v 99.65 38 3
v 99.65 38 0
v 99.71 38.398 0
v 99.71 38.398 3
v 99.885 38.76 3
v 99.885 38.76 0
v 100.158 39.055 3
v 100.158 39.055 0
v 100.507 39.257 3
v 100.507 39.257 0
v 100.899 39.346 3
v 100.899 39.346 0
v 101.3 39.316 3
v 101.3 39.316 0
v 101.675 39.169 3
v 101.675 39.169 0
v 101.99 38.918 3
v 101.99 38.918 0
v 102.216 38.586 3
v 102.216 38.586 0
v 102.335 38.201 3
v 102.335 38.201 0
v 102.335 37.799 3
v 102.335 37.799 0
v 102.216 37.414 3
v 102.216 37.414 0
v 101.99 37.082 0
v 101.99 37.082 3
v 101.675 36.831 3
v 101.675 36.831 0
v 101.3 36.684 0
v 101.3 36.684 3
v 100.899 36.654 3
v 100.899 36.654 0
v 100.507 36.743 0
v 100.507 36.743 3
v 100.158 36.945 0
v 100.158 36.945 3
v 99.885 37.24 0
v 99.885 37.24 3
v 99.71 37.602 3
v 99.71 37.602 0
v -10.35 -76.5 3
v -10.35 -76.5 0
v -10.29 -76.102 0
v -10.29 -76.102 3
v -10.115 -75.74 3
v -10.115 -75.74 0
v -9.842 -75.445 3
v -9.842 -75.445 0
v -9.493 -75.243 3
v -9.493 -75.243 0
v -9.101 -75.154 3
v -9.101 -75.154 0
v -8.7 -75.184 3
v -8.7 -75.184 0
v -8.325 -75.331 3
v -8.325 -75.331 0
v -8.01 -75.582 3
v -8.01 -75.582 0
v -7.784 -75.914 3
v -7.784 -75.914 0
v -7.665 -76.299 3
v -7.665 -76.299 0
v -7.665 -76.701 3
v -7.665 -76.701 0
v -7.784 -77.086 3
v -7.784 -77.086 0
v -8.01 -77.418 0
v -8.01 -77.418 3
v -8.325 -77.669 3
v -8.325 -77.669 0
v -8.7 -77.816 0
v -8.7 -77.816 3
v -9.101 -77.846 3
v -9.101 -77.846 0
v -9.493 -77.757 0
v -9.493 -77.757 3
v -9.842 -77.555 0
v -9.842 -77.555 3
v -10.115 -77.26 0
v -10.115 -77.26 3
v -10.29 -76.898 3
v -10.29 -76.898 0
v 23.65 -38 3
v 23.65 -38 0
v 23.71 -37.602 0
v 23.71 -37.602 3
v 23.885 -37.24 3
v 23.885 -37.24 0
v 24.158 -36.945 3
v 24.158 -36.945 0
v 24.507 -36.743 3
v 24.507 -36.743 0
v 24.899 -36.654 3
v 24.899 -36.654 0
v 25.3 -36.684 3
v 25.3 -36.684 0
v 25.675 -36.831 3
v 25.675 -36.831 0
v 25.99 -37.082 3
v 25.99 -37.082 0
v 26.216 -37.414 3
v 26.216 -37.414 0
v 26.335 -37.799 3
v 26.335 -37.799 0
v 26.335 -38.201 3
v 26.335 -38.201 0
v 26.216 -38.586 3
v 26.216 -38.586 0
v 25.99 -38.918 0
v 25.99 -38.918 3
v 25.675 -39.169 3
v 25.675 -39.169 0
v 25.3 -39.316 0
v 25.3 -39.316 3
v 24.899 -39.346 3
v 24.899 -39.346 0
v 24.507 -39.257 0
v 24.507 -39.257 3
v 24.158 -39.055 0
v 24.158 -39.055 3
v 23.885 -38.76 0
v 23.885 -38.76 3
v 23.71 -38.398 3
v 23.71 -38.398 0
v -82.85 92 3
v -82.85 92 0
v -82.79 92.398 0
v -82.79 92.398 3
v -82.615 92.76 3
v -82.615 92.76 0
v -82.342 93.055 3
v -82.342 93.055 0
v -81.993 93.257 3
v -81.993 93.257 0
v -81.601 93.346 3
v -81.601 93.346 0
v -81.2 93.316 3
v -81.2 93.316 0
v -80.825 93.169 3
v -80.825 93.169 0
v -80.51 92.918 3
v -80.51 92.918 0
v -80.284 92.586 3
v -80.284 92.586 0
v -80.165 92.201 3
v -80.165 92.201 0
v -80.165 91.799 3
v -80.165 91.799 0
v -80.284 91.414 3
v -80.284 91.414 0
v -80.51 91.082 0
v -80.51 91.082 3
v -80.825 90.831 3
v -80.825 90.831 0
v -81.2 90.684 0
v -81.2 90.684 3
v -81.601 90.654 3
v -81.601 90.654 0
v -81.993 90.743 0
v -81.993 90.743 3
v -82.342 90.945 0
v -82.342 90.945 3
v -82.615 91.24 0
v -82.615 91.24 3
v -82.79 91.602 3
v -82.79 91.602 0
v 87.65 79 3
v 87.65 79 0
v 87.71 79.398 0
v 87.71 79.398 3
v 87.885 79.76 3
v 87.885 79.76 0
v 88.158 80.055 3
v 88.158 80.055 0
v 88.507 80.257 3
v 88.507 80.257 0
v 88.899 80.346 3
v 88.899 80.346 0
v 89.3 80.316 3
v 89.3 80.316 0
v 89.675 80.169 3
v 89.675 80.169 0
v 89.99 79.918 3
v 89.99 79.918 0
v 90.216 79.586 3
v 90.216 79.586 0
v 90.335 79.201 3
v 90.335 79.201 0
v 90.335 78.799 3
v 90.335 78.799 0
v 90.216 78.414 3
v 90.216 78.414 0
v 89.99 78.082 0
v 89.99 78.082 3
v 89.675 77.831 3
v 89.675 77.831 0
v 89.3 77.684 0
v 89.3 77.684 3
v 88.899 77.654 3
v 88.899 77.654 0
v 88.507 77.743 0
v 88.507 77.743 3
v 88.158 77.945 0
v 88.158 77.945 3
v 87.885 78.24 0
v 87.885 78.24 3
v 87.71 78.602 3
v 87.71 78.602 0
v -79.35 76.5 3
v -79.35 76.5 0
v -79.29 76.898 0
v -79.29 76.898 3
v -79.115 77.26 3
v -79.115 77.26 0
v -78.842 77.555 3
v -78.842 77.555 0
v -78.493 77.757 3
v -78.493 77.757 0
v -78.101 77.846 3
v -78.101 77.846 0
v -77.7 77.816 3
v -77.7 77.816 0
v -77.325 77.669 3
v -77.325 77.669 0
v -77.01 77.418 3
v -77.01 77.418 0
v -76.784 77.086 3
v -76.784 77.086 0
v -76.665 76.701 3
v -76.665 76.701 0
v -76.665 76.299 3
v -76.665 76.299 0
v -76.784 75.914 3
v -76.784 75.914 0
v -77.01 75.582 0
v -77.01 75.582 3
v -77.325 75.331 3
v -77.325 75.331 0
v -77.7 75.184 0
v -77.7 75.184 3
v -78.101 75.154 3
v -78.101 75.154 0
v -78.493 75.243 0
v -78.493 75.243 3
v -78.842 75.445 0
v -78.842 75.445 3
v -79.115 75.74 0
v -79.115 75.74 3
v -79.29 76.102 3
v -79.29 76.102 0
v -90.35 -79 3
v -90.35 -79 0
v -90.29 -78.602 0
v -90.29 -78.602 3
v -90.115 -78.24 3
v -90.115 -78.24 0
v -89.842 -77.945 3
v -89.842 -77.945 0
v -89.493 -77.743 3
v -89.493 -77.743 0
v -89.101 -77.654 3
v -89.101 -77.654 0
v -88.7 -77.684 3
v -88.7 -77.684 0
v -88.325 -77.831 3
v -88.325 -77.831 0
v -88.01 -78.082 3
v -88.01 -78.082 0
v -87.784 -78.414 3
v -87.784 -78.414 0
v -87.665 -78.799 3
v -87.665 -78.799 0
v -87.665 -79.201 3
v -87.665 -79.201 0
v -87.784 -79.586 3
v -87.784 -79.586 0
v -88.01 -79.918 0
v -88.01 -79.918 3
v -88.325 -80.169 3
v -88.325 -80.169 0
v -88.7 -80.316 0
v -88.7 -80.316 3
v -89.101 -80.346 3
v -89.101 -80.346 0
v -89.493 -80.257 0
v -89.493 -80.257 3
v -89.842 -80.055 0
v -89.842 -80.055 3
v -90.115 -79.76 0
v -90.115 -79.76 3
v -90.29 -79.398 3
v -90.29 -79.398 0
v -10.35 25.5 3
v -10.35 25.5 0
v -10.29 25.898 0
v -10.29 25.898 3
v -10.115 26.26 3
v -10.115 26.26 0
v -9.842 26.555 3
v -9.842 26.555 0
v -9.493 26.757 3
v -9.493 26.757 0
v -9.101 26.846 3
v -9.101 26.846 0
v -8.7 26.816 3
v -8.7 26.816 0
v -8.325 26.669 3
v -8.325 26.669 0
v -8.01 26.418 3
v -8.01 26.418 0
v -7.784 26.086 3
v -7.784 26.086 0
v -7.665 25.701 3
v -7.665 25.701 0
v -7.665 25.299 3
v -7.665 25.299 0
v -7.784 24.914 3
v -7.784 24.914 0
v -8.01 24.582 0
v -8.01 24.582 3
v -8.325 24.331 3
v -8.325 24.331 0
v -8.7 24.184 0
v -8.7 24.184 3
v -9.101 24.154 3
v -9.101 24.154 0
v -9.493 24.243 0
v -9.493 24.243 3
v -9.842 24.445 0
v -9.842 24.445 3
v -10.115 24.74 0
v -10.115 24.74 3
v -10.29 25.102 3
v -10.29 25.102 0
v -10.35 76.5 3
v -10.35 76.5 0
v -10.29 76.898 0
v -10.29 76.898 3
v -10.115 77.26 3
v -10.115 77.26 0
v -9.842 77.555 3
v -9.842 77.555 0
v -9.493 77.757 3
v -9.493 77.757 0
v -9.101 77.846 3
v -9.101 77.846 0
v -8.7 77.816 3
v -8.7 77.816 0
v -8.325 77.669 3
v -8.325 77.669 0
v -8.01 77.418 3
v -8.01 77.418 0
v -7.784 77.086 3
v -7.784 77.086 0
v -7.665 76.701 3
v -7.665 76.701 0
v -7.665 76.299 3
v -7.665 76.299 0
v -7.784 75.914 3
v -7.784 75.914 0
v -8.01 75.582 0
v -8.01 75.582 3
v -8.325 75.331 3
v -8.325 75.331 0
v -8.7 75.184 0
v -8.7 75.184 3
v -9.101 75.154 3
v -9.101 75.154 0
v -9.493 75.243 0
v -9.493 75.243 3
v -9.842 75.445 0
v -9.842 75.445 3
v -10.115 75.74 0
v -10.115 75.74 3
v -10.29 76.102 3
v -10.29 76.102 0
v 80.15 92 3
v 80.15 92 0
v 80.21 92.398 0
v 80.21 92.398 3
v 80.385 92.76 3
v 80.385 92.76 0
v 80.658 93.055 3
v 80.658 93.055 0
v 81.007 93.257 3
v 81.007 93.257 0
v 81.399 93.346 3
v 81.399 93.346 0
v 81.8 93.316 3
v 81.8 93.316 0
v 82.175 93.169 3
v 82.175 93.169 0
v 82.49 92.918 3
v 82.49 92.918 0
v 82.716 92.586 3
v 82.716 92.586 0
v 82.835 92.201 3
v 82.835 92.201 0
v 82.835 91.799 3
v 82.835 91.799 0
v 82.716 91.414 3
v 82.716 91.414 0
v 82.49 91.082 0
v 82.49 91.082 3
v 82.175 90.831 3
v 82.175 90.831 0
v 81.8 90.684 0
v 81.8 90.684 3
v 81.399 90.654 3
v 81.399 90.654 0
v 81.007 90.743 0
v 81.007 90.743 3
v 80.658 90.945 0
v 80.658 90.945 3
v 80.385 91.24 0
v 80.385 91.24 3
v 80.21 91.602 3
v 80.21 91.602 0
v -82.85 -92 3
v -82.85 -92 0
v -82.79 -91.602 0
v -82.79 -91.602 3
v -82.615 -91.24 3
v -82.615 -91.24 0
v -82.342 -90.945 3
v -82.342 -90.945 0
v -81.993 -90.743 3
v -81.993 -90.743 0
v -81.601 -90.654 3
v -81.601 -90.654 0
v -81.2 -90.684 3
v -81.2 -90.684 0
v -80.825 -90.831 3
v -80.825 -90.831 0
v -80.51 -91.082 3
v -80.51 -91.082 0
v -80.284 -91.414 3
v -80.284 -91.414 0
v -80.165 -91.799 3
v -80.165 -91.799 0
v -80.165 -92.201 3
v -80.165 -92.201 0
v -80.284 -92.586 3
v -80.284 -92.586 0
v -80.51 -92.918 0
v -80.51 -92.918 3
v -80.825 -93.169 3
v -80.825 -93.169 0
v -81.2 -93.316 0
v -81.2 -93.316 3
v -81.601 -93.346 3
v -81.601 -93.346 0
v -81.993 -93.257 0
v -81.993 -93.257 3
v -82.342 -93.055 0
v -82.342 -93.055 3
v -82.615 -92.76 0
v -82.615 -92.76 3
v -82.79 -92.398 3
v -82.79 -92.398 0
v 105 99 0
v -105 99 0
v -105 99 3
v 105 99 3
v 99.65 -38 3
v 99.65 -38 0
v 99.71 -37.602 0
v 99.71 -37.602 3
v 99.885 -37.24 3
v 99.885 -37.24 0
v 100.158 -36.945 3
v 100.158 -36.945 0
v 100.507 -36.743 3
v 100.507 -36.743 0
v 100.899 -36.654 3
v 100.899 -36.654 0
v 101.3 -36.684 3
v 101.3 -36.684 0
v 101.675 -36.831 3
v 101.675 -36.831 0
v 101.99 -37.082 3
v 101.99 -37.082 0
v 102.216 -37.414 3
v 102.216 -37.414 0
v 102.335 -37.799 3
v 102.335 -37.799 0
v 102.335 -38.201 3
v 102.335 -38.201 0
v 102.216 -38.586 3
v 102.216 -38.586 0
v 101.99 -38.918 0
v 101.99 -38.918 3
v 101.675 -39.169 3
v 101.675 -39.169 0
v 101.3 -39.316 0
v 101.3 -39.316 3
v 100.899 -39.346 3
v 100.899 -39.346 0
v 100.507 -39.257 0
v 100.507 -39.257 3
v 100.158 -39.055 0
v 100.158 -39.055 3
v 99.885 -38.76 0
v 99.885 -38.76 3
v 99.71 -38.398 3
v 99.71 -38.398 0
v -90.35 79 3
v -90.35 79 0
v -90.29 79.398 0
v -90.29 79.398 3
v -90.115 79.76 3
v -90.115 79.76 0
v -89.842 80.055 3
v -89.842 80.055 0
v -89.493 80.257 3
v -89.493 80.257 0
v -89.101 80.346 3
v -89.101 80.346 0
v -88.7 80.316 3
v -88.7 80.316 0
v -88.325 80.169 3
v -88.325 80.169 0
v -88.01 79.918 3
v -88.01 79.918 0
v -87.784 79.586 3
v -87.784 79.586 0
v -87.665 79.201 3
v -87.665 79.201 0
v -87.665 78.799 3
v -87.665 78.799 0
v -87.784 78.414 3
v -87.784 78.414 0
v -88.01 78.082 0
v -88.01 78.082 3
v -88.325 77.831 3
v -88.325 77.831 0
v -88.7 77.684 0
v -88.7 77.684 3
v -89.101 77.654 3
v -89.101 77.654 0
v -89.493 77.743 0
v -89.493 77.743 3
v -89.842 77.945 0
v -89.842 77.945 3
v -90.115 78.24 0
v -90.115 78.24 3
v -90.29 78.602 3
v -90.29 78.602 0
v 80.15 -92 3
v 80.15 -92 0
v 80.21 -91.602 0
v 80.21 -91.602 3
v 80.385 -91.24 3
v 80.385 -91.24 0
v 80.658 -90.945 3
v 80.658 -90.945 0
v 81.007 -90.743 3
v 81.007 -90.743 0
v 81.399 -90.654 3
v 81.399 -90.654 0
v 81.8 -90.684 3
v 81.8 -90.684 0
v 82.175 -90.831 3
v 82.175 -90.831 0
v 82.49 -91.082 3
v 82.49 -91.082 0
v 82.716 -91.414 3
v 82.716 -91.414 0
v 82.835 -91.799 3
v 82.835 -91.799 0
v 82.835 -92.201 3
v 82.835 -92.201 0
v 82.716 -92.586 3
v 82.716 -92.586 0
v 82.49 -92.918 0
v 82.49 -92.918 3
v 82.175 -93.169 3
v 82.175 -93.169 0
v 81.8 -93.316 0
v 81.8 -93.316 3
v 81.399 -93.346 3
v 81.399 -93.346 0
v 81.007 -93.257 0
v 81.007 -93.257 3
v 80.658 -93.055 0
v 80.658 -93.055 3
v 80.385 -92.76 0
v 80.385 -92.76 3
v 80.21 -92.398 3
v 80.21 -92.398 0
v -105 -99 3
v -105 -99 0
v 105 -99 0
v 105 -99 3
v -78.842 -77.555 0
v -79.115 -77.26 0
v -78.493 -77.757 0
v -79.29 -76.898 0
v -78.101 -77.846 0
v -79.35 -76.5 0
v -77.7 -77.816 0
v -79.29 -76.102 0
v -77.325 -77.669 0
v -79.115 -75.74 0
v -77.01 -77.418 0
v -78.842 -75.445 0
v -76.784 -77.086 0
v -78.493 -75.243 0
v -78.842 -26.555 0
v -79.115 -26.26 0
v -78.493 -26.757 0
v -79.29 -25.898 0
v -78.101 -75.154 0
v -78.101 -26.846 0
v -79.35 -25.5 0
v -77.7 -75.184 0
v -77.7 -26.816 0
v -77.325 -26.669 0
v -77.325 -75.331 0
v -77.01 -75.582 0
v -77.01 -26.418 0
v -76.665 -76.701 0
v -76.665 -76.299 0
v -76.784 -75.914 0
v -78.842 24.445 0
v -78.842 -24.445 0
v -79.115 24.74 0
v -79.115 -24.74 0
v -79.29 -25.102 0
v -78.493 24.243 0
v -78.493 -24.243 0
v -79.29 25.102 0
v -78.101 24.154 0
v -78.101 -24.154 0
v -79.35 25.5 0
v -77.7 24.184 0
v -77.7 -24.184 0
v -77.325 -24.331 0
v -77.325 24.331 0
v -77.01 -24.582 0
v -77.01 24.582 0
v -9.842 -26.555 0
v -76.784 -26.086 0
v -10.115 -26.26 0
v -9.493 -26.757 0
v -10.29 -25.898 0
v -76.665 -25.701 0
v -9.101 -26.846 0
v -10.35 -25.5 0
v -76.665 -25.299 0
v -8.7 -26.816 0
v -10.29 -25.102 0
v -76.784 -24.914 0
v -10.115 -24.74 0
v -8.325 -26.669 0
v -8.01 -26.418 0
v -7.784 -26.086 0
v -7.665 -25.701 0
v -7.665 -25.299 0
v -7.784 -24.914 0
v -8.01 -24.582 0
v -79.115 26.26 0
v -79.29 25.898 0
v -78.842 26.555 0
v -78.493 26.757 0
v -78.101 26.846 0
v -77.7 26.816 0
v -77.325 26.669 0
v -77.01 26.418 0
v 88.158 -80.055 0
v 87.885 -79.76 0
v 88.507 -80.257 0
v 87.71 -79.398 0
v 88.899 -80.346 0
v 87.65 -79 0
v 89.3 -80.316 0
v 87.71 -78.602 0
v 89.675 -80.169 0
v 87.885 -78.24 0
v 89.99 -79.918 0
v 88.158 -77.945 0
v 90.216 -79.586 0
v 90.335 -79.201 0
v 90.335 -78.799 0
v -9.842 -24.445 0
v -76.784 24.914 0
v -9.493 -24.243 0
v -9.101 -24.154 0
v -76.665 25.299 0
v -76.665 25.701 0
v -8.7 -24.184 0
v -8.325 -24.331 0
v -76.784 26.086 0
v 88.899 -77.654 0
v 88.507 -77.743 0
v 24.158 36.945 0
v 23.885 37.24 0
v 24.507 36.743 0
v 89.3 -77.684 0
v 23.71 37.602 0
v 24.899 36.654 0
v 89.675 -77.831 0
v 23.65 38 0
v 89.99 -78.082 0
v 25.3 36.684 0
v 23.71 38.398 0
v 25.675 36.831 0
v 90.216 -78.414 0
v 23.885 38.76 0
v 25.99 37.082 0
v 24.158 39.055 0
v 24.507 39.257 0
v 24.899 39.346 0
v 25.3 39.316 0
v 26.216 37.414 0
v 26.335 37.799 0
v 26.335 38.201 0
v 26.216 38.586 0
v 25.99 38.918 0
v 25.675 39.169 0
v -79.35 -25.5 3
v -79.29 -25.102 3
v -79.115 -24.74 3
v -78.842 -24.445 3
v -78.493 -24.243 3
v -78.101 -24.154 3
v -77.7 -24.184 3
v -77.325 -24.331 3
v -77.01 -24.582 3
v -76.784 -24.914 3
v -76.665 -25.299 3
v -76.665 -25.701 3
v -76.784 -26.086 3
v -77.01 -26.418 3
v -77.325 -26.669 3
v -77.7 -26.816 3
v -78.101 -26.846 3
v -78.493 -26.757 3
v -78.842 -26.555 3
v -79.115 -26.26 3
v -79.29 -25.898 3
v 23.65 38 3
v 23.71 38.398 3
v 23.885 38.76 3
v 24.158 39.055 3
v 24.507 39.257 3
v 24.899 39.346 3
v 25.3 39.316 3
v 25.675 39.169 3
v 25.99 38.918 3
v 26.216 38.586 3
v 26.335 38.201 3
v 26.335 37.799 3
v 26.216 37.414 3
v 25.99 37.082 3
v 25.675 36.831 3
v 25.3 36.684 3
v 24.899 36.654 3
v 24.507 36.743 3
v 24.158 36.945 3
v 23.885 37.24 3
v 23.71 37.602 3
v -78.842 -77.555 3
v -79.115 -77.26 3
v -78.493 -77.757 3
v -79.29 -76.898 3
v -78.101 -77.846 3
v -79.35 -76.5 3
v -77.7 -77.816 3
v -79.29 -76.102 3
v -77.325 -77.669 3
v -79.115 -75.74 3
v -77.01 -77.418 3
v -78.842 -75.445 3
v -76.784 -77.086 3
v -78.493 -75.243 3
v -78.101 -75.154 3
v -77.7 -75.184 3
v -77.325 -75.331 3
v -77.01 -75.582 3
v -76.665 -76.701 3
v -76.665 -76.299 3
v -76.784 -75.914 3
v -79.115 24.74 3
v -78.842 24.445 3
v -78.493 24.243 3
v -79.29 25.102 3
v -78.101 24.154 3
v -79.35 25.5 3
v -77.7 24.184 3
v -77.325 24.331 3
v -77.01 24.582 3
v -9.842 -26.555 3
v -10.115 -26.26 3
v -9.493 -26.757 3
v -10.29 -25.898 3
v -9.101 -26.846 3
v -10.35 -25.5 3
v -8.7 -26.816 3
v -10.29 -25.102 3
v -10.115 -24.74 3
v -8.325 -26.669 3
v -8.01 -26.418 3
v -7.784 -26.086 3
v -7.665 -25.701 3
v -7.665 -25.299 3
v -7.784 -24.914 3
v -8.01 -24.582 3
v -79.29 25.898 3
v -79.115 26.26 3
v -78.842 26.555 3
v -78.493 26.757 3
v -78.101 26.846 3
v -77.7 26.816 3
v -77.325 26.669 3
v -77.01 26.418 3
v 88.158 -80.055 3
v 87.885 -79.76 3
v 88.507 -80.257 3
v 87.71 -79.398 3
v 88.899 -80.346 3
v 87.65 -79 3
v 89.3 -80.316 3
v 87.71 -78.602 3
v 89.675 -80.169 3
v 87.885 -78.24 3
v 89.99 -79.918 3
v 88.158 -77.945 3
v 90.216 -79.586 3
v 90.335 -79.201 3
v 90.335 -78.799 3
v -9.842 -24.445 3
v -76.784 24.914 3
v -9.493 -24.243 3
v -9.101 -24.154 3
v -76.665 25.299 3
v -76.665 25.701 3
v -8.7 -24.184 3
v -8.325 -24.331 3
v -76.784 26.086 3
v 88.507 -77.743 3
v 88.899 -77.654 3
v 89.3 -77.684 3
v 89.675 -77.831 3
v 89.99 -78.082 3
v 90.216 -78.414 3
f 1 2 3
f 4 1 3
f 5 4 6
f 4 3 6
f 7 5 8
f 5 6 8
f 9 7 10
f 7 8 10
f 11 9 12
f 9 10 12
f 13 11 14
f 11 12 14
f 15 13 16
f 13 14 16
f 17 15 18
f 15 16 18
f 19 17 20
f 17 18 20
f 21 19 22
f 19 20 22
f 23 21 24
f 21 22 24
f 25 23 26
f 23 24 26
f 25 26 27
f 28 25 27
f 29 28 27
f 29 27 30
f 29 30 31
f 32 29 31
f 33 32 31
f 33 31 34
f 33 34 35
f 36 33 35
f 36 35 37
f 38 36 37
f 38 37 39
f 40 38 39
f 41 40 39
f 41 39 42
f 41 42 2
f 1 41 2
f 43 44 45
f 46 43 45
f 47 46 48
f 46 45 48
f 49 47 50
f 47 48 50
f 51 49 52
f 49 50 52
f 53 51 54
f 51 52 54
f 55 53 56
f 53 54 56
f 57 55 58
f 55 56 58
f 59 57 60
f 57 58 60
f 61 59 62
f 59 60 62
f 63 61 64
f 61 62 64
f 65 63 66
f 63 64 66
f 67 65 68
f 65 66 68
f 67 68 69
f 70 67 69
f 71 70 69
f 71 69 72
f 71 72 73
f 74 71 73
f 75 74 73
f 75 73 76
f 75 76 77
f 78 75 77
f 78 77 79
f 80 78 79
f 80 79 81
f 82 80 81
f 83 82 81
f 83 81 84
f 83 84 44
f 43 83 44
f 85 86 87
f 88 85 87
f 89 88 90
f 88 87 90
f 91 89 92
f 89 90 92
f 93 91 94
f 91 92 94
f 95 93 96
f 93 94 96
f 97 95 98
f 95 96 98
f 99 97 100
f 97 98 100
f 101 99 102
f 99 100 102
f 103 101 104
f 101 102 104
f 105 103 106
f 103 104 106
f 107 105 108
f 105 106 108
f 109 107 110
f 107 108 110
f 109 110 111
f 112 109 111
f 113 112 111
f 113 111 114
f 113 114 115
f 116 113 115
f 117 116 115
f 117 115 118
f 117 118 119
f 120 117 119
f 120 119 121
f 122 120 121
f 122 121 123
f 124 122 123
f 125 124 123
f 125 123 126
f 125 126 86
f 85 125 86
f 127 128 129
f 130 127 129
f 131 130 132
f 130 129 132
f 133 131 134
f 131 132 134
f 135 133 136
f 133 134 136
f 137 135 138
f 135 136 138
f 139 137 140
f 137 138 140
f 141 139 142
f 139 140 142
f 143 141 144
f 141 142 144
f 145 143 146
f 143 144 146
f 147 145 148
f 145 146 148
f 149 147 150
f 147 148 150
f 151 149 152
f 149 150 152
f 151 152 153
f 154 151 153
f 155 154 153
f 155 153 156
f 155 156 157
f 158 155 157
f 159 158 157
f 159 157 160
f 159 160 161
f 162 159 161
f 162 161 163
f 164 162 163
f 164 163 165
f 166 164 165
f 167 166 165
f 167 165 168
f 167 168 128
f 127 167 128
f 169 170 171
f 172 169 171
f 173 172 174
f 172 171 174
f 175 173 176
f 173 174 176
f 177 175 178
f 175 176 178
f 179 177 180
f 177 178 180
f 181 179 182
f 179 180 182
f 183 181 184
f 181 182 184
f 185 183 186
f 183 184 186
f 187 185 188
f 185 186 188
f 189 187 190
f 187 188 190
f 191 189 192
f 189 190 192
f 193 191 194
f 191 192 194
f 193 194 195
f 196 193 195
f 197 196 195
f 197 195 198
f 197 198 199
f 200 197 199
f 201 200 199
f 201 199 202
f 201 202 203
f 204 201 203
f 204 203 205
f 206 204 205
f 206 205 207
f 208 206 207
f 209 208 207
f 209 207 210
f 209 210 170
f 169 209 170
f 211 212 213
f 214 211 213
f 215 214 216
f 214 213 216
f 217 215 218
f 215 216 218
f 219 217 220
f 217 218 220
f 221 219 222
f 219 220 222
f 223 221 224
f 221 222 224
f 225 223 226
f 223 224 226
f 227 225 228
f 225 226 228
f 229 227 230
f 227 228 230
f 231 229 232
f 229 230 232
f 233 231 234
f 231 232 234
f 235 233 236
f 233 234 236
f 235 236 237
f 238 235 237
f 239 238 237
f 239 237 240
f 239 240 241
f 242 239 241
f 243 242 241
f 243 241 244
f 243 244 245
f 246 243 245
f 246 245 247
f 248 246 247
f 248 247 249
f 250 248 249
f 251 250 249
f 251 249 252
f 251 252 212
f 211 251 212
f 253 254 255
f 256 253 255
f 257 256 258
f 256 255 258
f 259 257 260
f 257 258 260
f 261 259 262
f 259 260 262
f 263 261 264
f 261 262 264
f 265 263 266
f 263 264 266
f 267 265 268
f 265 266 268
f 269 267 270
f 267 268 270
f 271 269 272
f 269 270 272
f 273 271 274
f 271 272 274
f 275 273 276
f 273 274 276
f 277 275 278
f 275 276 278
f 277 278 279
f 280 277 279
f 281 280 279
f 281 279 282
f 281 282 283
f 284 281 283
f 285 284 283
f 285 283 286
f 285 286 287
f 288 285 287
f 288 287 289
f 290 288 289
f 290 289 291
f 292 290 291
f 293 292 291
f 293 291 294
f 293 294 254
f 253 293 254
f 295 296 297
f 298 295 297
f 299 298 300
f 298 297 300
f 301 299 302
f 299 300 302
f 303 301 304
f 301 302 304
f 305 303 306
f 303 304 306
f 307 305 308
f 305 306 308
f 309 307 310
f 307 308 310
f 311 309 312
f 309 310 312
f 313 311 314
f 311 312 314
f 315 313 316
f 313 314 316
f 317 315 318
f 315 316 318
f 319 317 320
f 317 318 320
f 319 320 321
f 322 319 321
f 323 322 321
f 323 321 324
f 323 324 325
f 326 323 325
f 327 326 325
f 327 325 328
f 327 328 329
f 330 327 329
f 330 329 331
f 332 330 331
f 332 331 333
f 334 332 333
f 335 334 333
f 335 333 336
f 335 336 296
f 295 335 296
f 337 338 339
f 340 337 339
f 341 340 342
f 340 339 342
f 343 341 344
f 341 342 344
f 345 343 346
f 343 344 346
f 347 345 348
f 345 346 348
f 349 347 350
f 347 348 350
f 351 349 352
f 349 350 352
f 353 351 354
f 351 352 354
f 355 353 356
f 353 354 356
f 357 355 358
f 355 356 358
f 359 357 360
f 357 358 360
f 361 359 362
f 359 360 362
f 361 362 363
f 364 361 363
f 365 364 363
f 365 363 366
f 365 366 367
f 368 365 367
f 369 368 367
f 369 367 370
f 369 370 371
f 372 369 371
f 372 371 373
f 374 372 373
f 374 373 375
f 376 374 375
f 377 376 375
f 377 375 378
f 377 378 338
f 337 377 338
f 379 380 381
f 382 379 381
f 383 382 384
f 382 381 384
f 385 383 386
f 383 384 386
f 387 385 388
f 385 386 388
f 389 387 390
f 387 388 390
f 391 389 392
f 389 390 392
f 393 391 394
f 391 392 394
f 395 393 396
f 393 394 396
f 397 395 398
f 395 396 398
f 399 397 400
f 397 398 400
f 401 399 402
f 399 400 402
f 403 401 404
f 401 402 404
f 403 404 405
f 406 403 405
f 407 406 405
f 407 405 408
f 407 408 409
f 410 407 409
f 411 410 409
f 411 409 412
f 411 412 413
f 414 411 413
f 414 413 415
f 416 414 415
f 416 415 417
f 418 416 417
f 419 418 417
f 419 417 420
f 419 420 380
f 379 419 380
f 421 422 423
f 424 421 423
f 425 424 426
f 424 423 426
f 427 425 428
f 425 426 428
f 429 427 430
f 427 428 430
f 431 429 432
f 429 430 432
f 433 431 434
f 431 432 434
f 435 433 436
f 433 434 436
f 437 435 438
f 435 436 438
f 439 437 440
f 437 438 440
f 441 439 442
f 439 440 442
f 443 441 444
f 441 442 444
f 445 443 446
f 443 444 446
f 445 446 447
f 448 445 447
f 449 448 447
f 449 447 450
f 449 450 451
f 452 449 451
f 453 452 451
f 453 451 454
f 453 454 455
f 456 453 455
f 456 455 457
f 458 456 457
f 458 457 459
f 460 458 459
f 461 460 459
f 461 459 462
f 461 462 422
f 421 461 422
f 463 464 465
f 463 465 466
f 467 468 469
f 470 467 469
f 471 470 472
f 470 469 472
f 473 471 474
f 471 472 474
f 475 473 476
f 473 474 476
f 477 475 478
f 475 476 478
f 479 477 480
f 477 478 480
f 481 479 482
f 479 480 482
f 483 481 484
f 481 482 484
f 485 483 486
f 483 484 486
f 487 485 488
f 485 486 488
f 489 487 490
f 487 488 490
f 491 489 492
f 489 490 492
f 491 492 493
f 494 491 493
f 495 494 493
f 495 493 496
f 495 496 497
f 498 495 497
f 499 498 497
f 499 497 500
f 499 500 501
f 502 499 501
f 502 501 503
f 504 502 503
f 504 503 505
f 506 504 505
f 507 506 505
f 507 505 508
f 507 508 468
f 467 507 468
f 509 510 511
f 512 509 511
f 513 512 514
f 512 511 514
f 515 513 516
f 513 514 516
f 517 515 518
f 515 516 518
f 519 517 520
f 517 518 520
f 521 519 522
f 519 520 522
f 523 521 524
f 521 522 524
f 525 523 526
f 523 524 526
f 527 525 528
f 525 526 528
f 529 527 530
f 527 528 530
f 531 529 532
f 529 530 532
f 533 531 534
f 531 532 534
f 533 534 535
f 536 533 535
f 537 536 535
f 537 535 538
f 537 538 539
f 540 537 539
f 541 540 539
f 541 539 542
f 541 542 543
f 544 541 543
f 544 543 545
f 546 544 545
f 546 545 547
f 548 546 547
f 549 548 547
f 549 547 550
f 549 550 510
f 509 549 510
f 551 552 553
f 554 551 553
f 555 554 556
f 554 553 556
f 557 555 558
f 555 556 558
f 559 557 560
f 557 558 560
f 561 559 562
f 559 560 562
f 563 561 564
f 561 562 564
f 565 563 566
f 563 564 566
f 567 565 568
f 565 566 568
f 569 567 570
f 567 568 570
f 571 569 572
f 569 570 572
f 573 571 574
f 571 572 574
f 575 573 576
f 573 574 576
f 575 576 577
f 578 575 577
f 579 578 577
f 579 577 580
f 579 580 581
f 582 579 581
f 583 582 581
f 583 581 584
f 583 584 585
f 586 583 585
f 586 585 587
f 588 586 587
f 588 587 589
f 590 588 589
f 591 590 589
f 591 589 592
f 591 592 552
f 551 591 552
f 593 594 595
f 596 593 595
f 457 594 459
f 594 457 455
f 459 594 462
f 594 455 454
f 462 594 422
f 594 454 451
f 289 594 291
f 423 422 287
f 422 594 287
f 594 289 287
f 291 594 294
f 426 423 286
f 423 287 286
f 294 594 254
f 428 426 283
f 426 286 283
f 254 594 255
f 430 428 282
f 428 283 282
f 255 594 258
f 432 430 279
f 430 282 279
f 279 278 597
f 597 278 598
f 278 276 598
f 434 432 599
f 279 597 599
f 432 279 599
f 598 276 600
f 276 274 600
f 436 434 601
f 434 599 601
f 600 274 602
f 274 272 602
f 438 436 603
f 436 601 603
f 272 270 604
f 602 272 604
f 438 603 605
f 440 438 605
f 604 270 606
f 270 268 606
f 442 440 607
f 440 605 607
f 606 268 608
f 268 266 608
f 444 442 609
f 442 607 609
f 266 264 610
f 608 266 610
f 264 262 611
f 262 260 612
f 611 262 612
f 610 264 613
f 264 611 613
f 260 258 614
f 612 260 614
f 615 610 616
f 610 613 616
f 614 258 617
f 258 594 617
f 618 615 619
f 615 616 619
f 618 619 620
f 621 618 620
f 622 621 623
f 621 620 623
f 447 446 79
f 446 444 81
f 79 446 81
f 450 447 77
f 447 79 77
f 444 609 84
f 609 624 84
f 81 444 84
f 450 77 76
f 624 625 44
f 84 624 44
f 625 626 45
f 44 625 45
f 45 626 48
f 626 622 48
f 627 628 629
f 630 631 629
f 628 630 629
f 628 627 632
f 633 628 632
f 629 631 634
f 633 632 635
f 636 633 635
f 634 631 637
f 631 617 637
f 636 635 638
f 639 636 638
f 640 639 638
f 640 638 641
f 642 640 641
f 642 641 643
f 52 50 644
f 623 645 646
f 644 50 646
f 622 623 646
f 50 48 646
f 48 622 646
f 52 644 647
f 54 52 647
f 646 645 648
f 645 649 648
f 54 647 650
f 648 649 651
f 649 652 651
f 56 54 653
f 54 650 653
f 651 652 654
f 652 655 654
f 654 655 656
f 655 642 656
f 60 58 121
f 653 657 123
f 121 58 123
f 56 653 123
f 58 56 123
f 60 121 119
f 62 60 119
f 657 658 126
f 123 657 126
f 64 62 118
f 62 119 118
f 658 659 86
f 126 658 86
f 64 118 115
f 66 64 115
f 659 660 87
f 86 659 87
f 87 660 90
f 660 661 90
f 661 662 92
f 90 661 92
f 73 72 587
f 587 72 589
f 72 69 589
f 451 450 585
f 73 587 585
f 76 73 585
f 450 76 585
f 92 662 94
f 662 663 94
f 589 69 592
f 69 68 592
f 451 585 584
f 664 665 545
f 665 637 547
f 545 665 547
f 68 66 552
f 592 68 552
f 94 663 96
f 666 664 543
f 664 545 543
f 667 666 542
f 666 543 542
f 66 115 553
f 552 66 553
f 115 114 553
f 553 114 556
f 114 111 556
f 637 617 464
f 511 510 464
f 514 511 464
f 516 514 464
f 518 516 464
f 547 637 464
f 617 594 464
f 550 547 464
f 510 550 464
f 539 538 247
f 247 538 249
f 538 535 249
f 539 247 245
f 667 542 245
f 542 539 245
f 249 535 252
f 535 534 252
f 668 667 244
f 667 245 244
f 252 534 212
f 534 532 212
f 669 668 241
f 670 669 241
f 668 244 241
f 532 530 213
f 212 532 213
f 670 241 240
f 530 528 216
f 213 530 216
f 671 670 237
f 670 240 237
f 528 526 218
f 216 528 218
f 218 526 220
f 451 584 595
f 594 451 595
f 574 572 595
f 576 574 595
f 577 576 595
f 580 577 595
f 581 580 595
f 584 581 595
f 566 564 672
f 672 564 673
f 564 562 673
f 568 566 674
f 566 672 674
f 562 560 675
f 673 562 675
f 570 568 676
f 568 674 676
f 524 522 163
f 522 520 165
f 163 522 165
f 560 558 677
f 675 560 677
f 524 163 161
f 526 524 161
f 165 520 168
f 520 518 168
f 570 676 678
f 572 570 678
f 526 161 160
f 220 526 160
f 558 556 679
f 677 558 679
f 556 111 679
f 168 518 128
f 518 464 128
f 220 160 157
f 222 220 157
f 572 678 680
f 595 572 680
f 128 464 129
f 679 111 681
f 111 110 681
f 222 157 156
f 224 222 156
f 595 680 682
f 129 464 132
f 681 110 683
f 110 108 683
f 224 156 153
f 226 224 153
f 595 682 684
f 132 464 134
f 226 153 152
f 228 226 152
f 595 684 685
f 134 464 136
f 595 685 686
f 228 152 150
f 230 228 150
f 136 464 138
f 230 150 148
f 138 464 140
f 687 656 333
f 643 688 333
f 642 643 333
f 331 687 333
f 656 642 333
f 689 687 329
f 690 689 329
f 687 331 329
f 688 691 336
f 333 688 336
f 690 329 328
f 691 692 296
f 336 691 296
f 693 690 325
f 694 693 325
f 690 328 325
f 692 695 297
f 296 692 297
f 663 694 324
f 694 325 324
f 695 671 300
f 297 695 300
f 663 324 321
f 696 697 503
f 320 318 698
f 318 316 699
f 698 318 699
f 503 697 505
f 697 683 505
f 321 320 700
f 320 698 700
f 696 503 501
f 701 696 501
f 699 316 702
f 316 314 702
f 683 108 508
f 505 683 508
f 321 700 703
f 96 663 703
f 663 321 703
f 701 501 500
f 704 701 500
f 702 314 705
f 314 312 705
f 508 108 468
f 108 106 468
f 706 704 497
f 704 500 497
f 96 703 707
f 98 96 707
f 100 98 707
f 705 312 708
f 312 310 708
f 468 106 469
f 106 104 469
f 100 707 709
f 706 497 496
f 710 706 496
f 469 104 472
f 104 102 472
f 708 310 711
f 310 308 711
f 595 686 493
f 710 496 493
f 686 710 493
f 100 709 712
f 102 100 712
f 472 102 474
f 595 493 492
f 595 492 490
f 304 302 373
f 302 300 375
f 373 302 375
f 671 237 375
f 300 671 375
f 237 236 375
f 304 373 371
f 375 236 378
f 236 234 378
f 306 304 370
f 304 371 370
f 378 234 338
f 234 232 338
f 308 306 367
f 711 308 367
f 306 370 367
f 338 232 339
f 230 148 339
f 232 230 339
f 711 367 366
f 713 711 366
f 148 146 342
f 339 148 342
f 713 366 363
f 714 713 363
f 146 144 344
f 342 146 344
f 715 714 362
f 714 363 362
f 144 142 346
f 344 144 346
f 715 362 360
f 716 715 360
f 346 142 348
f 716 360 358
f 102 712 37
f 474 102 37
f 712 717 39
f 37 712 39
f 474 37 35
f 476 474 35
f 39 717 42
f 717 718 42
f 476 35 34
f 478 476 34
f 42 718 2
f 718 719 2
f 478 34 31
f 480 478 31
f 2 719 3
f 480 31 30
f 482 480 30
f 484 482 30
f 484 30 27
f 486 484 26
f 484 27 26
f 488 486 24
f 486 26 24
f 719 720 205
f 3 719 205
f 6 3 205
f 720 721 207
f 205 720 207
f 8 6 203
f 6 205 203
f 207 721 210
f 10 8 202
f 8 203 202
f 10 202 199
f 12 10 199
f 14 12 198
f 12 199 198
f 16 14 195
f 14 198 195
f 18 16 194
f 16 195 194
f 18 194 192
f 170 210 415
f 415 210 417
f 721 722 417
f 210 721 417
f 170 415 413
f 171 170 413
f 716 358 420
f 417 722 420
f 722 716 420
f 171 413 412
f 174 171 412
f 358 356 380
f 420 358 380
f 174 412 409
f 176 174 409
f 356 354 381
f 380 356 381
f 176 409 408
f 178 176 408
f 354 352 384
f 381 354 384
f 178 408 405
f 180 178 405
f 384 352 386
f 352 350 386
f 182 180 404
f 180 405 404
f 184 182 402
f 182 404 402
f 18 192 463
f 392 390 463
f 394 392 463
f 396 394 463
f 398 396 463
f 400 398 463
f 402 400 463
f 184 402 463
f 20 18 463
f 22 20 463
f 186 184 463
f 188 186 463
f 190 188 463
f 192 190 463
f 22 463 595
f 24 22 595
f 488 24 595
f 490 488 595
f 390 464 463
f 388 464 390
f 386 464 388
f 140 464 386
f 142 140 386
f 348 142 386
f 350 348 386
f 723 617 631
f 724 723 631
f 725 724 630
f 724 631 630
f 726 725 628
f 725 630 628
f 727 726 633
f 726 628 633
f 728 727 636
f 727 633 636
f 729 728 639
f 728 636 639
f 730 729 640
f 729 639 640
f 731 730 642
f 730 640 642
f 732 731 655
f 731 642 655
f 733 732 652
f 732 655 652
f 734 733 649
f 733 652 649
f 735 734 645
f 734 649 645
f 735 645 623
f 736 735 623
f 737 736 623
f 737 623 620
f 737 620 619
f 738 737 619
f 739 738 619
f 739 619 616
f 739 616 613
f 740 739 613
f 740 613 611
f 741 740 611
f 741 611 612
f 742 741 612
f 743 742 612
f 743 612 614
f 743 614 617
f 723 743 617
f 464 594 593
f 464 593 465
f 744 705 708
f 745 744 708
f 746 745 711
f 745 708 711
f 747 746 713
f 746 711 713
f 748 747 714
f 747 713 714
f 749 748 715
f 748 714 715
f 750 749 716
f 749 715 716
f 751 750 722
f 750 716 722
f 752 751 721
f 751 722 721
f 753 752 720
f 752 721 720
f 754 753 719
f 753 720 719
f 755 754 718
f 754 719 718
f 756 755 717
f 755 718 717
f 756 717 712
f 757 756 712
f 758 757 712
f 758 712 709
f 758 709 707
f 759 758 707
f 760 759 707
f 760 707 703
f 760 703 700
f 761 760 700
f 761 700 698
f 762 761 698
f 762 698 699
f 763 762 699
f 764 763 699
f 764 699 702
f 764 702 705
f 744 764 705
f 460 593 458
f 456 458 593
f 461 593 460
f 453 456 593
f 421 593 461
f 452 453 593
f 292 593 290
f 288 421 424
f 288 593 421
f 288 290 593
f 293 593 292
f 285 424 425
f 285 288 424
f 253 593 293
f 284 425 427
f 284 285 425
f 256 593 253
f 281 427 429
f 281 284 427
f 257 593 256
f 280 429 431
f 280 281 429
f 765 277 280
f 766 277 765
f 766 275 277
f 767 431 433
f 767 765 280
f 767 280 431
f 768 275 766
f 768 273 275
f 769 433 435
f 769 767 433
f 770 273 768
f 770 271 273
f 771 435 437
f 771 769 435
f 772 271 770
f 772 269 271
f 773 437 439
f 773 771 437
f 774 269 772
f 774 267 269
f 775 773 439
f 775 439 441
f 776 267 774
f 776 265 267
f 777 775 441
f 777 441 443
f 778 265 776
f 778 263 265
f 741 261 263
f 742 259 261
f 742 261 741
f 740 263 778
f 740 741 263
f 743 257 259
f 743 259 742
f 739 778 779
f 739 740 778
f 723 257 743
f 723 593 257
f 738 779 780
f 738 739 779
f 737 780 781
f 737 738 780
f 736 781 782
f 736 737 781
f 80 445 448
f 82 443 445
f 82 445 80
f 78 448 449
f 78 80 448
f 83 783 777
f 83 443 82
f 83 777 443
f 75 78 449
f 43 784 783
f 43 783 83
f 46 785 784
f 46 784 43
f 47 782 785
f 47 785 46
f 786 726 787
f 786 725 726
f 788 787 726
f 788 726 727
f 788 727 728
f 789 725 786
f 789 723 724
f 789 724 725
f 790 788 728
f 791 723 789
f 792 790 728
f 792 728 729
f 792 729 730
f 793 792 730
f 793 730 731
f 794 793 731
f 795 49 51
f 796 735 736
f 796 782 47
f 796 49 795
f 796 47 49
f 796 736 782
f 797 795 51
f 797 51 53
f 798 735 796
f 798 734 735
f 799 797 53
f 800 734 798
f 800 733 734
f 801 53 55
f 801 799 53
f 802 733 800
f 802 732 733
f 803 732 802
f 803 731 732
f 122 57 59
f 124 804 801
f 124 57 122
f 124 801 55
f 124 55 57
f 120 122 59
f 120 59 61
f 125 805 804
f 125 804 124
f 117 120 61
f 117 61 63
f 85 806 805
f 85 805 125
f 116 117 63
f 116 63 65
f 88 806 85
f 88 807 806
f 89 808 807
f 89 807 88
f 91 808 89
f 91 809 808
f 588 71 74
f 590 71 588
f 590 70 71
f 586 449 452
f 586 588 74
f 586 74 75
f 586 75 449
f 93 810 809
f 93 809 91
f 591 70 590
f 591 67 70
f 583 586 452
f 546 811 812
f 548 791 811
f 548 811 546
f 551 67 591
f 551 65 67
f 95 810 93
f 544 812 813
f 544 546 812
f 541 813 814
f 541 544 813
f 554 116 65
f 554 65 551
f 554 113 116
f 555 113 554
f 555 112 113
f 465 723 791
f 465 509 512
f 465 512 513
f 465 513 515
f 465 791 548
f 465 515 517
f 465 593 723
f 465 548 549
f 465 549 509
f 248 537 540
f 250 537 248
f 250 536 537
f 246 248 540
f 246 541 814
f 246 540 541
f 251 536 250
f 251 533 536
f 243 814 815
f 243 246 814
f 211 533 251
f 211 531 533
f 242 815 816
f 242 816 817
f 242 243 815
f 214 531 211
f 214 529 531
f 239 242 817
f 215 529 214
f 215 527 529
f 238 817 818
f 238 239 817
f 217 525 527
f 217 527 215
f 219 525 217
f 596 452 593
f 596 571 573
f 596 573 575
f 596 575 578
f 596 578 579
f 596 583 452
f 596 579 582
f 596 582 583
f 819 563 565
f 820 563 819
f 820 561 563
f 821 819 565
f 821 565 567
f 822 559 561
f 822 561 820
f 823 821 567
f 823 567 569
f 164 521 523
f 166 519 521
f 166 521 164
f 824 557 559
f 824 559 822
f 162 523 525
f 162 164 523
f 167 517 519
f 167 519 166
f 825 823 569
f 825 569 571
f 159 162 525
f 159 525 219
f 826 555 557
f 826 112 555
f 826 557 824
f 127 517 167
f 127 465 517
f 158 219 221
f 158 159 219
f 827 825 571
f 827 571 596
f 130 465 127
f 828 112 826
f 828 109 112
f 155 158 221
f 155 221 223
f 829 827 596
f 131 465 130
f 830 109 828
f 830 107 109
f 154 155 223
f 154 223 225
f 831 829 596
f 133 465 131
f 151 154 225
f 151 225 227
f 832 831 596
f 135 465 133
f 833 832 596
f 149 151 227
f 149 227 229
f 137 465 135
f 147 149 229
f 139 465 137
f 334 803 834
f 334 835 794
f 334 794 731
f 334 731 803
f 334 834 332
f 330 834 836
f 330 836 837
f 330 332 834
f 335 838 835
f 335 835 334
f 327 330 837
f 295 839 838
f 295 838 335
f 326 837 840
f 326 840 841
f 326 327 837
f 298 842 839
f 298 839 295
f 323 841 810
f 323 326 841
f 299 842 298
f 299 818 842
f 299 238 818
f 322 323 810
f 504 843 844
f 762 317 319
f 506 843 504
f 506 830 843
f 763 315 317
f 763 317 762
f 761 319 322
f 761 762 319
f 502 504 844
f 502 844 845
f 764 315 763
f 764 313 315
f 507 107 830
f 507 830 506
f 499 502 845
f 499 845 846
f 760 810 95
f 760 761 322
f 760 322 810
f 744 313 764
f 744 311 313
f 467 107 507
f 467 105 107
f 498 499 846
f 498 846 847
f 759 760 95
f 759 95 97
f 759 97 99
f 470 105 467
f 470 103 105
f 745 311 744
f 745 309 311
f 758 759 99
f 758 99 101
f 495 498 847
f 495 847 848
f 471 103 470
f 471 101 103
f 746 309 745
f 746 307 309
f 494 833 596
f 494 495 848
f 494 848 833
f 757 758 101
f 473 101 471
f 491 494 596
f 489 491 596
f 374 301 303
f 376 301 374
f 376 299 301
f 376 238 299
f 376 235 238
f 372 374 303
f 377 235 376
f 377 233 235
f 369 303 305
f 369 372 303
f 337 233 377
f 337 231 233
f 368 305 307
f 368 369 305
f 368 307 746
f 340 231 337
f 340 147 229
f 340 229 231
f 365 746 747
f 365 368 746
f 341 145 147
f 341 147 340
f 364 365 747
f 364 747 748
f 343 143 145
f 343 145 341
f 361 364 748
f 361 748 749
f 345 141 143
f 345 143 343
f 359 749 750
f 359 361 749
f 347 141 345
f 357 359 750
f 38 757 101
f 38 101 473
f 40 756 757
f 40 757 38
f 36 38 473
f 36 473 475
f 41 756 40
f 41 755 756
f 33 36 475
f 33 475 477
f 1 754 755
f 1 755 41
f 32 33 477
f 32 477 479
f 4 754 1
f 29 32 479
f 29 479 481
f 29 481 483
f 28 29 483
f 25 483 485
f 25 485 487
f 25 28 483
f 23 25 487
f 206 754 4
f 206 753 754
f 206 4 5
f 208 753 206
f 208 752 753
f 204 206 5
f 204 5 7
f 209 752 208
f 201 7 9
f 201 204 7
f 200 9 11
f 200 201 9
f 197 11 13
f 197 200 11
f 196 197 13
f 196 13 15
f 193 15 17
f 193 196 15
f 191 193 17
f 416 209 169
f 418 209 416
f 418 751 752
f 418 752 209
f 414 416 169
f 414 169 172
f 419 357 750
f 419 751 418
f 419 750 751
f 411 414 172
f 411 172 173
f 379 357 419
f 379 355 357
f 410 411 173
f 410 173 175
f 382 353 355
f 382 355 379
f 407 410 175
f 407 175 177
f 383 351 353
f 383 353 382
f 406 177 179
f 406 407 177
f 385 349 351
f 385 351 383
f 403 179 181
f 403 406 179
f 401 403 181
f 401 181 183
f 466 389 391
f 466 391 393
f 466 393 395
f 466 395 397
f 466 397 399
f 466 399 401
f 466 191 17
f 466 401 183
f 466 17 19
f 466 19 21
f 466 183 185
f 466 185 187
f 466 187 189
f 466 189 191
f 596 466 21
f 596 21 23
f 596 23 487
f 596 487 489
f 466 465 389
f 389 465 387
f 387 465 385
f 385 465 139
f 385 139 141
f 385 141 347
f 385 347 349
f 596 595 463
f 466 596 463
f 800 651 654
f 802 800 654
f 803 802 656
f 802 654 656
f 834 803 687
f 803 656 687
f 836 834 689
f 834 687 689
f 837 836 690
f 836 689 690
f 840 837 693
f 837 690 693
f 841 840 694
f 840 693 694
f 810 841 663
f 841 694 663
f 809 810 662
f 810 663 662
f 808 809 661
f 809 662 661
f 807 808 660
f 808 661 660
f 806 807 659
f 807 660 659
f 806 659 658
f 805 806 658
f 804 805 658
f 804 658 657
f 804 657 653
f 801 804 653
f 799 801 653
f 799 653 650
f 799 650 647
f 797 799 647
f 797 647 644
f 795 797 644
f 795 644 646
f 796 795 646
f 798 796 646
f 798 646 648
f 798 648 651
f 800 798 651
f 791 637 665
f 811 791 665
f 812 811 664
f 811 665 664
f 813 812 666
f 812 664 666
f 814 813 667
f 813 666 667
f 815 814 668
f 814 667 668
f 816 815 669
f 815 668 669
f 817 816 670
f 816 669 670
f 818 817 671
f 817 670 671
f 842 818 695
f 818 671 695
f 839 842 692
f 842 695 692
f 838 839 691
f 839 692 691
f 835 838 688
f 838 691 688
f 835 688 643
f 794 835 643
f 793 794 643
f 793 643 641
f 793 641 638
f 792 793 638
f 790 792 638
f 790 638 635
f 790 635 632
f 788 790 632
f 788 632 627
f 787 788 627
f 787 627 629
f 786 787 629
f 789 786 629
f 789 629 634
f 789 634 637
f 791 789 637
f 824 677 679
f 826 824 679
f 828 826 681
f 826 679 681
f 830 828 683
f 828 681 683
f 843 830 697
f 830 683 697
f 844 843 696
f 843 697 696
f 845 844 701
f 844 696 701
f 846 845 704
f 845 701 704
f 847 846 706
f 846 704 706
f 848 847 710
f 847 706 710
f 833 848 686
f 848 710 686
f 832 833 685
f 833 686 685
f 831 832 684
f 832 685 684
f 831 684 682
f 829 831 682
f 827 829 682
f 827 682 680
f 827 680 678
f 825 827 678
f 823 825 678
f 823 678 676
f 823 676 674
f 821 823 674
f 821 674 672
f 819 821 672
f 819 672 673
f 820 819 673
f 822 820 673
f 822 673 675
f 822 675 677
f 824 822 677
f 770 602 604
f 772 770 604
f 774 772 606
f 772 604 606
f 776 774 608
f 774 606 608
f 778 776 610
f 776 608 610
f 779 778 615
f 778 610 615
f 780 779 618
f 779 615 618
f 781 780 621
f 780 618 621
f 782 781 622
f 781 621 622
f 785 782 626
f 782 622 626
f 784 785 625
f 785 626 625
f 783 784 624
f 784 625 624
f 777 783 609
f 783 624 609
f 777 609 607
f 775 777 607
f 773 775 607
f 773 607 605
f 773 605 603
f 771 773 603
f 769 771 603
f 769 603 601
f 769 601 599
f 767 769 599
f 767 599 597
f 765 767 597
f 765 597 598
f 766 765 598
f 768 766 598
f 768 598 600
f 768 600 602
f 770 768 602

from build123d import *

# Parameters (mm, degrees)
ESQUISSE1_W            = 210
ESQUISSE1_H            = 198
BOSS_EXTRU_1_DEPTH     = 3
D_GAGEMENT_M2_51_D     = 2.7
D_GAGEMENT_M2_51_DEPTH = 3


with BuildPart() as part:
    # Esquisse1 → Boss.-Extru.1 (new body)
    with BuildSketch(Plane.XY):
        Rectangle(ESQUISSE1_W, ESQUISSE1_H)
    extrude(amount=BOSS_EXTRU_1_DEPTH)

    # Dégagement M2.51
    with Locations(Plane.XY.offset(3)):
        with Locations((-81.5, -92), (-89, -79), (-78, -76.5), (-78, -25.5), (-9, -76.5), (-9, -25.5), (-9, 25.5), (-78, 25.5), (-78, 76.5), (-89, 79), (-81.5, 92), (25, 38), (25, -38), (101, -38), (101, 38), (89, 79), (81.5, 92), (81.5, -92), (89, -79), (-9, 76.5)):
            Hole(D_GAGEMENT_M2_51_D / 2, depth=D_GAGEMENT_M2_51_DEPTH)


solid = part.part
